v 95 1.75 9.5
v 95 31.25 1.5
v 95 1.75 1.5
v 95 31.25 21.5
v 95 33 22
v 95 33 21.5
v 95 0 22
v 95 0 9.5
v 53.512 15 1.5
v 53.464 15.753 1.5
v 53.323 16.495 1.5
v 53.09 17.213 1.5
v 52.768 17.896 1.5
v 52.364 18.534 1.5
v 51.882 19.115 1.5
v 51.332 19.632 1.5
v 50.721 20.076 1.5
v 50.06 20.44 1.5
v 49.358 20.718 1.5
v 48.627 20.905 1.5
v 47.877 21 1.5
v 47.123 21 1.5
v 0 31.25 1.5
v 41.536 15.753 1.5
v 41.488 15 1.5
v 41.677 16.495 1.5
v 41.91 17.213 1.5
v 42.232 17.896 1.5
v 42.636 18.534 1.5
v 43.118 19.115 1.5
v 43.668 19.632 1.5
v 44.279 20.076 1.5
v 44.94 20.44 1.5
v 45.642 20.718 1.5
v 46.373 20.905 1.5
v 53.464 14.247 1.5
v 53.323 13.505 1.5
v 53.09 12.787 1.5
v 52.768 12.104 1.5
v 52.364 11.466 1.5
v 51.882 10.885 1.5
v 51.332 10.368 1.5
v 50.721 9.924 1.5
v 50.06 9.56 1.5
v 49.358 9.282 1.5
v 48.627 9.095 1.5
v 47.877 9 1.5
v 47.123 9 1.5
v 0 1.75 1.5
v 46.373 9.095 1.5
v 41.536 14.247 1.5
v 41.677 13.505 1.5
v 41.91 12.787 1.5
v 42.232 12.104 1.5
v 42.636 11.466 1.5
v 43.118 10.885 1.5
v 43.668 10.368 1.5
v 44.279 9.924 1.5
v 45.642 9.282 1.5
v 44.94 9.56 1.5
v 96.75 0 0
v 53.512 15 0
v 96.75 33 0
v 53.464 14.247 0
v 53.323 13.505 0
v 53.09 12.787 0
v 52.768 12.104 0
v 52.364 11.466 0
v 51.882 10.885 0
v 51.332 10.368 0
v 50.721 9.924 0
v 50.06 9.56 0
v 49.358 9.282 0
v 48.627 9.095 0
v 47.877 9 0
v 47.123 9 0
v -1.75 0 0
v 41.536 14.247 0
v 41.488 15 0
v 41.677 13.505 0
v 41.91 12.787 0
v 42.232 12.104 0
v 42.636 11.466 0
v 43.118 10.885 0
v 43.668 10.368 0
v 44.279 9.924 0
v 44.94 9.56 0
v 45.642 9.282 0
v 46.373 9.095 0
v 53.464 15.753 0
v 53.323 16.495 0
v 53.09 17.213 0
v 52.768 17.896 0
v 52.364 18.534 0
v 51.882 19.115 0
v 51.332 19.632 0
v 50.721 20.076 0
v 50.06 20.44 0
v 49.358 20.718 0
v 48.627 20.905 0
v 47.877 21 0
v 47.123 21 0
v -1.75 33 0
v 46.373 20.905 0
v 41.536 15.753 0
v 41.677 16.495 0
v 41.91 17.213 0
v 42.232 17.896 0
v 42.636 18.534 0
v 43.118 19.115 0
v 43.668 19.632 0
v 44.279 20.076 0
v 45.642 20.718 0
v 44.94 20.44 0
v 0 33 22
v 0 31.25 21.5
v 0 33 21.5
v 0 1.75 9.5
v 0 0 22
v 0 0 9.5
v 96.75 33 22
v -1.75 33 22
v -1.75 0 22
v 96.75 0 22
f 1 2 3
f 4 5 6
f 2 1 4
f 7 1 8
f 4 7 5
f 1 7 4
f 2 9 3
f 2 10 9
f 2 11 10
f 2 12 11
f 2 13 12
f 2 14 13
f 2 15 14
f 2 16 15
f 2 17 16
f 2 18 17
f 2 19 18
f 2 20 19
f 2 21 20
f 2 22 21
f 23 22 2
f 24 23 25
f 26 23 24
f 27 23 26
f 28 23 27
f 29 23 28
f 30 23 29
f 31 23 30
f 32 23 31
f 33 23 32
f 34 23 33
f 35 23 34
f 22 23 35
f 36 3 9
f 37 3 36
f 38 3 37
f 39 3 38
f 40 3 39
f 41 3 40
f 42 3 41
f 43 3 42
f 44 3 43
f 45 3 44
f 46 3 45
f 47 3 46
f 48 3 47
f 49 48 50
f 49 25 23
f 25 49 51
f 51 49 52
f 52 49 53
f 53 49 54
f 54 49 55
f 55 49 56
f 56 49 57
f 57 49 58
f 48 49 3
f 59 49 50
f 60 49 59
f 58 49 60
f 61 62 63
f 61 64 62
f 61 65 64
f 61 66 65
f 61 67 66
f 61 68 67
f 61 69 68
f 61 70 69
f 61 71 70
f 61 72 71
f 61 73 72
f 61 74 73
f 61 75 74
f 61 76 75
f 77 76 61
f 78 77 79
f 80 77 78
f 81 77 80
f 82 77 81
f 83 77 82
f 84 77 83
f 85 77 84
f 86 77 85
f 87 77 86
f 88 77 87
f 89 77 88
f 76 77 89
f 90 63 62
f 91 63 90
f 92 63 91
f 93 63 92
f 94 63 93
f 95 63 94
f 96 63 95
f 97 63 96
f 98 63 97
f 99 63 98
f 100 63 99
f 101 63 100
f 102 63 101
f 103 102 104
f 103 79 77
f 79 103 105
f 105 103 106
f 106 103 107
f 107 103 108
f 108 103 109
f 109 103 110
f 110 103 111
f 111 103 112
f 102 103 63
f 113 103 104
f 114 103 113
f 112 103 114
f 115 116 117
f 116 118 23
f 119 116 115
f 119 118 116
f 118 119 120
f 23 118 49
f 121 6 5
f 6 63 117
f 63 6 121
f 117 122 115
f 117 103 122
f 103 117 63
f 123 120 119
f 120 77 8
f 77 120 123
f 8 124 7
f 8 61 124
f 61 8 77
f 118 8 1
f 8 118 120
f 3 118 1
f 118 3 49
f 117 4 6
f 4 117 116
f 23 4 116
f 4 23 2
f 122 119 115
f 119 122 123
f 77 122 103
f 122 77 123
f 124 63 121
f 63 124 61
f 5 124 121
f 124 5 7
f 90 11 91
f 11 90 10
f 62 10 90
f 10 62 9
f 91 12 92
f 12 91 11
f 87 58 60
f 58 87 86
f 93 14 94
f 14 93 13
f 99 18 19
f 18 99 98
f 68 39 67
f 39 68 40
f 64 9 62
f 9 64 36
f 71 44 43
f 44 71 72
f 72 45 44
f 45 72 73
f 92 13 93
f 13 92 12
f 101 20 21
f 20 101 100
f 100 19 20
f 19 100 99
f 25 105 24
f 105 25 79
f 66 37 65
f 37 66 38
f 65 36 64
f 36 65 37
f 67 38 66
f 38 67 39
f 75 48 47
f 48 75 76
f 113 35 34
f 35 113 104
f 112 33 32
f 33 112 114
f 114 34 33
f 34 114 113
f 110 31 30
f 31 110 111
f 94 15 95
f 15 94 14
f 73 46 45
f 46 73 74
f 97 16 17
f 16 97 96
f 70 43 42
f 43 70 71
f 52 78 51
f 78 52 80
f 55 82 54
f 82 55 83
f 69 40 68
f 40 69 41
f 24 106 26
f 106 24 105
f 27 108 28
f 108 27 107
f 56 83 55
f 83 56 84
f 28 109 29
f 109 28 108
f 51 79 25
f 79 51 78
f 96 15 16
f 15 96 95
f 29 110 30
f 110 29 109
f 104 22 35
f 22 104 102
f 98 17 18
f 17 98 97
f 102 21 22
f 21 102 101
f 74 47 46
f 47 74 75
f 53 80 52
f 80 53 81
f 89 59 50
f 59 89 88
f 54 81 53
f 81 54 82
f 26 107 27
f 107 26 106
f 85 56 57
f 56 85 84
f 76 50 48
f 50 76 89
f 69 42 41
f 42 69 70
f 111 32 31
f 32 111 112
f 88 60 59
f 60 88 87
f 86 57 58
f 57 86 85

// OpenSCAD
 difference() { 
   union() {
    //Base
        cube([95,33,1.5]);
    // Sides
        translate([0, 0, 1.5]) {
            color([1,0,0])
            cube([95,1.75,8]);
        }
        translate([0, 31.25, 1.5]) {
            color([1,0,0])
            cube([95,1.75,20]);
        }
        // Ends
    translate([-1.75, 0, 0]) {
            color([0,1,0])
            cube([1.75,33,22]);
        }
    translate([95, 0, 0]) {
            color([0,1,0])
            cube([1.75,33,22]);
        }
    }
    
    // Objective hole
    translate([47.5,15,-1]) cylinder_outer(8,6,50);
}
module cylinder_outer(height,radius,fn){
   fudge = 1/cos(180/fn);
   cylinder(h=height,r=radius*fudge,$fn=fn);
    }
